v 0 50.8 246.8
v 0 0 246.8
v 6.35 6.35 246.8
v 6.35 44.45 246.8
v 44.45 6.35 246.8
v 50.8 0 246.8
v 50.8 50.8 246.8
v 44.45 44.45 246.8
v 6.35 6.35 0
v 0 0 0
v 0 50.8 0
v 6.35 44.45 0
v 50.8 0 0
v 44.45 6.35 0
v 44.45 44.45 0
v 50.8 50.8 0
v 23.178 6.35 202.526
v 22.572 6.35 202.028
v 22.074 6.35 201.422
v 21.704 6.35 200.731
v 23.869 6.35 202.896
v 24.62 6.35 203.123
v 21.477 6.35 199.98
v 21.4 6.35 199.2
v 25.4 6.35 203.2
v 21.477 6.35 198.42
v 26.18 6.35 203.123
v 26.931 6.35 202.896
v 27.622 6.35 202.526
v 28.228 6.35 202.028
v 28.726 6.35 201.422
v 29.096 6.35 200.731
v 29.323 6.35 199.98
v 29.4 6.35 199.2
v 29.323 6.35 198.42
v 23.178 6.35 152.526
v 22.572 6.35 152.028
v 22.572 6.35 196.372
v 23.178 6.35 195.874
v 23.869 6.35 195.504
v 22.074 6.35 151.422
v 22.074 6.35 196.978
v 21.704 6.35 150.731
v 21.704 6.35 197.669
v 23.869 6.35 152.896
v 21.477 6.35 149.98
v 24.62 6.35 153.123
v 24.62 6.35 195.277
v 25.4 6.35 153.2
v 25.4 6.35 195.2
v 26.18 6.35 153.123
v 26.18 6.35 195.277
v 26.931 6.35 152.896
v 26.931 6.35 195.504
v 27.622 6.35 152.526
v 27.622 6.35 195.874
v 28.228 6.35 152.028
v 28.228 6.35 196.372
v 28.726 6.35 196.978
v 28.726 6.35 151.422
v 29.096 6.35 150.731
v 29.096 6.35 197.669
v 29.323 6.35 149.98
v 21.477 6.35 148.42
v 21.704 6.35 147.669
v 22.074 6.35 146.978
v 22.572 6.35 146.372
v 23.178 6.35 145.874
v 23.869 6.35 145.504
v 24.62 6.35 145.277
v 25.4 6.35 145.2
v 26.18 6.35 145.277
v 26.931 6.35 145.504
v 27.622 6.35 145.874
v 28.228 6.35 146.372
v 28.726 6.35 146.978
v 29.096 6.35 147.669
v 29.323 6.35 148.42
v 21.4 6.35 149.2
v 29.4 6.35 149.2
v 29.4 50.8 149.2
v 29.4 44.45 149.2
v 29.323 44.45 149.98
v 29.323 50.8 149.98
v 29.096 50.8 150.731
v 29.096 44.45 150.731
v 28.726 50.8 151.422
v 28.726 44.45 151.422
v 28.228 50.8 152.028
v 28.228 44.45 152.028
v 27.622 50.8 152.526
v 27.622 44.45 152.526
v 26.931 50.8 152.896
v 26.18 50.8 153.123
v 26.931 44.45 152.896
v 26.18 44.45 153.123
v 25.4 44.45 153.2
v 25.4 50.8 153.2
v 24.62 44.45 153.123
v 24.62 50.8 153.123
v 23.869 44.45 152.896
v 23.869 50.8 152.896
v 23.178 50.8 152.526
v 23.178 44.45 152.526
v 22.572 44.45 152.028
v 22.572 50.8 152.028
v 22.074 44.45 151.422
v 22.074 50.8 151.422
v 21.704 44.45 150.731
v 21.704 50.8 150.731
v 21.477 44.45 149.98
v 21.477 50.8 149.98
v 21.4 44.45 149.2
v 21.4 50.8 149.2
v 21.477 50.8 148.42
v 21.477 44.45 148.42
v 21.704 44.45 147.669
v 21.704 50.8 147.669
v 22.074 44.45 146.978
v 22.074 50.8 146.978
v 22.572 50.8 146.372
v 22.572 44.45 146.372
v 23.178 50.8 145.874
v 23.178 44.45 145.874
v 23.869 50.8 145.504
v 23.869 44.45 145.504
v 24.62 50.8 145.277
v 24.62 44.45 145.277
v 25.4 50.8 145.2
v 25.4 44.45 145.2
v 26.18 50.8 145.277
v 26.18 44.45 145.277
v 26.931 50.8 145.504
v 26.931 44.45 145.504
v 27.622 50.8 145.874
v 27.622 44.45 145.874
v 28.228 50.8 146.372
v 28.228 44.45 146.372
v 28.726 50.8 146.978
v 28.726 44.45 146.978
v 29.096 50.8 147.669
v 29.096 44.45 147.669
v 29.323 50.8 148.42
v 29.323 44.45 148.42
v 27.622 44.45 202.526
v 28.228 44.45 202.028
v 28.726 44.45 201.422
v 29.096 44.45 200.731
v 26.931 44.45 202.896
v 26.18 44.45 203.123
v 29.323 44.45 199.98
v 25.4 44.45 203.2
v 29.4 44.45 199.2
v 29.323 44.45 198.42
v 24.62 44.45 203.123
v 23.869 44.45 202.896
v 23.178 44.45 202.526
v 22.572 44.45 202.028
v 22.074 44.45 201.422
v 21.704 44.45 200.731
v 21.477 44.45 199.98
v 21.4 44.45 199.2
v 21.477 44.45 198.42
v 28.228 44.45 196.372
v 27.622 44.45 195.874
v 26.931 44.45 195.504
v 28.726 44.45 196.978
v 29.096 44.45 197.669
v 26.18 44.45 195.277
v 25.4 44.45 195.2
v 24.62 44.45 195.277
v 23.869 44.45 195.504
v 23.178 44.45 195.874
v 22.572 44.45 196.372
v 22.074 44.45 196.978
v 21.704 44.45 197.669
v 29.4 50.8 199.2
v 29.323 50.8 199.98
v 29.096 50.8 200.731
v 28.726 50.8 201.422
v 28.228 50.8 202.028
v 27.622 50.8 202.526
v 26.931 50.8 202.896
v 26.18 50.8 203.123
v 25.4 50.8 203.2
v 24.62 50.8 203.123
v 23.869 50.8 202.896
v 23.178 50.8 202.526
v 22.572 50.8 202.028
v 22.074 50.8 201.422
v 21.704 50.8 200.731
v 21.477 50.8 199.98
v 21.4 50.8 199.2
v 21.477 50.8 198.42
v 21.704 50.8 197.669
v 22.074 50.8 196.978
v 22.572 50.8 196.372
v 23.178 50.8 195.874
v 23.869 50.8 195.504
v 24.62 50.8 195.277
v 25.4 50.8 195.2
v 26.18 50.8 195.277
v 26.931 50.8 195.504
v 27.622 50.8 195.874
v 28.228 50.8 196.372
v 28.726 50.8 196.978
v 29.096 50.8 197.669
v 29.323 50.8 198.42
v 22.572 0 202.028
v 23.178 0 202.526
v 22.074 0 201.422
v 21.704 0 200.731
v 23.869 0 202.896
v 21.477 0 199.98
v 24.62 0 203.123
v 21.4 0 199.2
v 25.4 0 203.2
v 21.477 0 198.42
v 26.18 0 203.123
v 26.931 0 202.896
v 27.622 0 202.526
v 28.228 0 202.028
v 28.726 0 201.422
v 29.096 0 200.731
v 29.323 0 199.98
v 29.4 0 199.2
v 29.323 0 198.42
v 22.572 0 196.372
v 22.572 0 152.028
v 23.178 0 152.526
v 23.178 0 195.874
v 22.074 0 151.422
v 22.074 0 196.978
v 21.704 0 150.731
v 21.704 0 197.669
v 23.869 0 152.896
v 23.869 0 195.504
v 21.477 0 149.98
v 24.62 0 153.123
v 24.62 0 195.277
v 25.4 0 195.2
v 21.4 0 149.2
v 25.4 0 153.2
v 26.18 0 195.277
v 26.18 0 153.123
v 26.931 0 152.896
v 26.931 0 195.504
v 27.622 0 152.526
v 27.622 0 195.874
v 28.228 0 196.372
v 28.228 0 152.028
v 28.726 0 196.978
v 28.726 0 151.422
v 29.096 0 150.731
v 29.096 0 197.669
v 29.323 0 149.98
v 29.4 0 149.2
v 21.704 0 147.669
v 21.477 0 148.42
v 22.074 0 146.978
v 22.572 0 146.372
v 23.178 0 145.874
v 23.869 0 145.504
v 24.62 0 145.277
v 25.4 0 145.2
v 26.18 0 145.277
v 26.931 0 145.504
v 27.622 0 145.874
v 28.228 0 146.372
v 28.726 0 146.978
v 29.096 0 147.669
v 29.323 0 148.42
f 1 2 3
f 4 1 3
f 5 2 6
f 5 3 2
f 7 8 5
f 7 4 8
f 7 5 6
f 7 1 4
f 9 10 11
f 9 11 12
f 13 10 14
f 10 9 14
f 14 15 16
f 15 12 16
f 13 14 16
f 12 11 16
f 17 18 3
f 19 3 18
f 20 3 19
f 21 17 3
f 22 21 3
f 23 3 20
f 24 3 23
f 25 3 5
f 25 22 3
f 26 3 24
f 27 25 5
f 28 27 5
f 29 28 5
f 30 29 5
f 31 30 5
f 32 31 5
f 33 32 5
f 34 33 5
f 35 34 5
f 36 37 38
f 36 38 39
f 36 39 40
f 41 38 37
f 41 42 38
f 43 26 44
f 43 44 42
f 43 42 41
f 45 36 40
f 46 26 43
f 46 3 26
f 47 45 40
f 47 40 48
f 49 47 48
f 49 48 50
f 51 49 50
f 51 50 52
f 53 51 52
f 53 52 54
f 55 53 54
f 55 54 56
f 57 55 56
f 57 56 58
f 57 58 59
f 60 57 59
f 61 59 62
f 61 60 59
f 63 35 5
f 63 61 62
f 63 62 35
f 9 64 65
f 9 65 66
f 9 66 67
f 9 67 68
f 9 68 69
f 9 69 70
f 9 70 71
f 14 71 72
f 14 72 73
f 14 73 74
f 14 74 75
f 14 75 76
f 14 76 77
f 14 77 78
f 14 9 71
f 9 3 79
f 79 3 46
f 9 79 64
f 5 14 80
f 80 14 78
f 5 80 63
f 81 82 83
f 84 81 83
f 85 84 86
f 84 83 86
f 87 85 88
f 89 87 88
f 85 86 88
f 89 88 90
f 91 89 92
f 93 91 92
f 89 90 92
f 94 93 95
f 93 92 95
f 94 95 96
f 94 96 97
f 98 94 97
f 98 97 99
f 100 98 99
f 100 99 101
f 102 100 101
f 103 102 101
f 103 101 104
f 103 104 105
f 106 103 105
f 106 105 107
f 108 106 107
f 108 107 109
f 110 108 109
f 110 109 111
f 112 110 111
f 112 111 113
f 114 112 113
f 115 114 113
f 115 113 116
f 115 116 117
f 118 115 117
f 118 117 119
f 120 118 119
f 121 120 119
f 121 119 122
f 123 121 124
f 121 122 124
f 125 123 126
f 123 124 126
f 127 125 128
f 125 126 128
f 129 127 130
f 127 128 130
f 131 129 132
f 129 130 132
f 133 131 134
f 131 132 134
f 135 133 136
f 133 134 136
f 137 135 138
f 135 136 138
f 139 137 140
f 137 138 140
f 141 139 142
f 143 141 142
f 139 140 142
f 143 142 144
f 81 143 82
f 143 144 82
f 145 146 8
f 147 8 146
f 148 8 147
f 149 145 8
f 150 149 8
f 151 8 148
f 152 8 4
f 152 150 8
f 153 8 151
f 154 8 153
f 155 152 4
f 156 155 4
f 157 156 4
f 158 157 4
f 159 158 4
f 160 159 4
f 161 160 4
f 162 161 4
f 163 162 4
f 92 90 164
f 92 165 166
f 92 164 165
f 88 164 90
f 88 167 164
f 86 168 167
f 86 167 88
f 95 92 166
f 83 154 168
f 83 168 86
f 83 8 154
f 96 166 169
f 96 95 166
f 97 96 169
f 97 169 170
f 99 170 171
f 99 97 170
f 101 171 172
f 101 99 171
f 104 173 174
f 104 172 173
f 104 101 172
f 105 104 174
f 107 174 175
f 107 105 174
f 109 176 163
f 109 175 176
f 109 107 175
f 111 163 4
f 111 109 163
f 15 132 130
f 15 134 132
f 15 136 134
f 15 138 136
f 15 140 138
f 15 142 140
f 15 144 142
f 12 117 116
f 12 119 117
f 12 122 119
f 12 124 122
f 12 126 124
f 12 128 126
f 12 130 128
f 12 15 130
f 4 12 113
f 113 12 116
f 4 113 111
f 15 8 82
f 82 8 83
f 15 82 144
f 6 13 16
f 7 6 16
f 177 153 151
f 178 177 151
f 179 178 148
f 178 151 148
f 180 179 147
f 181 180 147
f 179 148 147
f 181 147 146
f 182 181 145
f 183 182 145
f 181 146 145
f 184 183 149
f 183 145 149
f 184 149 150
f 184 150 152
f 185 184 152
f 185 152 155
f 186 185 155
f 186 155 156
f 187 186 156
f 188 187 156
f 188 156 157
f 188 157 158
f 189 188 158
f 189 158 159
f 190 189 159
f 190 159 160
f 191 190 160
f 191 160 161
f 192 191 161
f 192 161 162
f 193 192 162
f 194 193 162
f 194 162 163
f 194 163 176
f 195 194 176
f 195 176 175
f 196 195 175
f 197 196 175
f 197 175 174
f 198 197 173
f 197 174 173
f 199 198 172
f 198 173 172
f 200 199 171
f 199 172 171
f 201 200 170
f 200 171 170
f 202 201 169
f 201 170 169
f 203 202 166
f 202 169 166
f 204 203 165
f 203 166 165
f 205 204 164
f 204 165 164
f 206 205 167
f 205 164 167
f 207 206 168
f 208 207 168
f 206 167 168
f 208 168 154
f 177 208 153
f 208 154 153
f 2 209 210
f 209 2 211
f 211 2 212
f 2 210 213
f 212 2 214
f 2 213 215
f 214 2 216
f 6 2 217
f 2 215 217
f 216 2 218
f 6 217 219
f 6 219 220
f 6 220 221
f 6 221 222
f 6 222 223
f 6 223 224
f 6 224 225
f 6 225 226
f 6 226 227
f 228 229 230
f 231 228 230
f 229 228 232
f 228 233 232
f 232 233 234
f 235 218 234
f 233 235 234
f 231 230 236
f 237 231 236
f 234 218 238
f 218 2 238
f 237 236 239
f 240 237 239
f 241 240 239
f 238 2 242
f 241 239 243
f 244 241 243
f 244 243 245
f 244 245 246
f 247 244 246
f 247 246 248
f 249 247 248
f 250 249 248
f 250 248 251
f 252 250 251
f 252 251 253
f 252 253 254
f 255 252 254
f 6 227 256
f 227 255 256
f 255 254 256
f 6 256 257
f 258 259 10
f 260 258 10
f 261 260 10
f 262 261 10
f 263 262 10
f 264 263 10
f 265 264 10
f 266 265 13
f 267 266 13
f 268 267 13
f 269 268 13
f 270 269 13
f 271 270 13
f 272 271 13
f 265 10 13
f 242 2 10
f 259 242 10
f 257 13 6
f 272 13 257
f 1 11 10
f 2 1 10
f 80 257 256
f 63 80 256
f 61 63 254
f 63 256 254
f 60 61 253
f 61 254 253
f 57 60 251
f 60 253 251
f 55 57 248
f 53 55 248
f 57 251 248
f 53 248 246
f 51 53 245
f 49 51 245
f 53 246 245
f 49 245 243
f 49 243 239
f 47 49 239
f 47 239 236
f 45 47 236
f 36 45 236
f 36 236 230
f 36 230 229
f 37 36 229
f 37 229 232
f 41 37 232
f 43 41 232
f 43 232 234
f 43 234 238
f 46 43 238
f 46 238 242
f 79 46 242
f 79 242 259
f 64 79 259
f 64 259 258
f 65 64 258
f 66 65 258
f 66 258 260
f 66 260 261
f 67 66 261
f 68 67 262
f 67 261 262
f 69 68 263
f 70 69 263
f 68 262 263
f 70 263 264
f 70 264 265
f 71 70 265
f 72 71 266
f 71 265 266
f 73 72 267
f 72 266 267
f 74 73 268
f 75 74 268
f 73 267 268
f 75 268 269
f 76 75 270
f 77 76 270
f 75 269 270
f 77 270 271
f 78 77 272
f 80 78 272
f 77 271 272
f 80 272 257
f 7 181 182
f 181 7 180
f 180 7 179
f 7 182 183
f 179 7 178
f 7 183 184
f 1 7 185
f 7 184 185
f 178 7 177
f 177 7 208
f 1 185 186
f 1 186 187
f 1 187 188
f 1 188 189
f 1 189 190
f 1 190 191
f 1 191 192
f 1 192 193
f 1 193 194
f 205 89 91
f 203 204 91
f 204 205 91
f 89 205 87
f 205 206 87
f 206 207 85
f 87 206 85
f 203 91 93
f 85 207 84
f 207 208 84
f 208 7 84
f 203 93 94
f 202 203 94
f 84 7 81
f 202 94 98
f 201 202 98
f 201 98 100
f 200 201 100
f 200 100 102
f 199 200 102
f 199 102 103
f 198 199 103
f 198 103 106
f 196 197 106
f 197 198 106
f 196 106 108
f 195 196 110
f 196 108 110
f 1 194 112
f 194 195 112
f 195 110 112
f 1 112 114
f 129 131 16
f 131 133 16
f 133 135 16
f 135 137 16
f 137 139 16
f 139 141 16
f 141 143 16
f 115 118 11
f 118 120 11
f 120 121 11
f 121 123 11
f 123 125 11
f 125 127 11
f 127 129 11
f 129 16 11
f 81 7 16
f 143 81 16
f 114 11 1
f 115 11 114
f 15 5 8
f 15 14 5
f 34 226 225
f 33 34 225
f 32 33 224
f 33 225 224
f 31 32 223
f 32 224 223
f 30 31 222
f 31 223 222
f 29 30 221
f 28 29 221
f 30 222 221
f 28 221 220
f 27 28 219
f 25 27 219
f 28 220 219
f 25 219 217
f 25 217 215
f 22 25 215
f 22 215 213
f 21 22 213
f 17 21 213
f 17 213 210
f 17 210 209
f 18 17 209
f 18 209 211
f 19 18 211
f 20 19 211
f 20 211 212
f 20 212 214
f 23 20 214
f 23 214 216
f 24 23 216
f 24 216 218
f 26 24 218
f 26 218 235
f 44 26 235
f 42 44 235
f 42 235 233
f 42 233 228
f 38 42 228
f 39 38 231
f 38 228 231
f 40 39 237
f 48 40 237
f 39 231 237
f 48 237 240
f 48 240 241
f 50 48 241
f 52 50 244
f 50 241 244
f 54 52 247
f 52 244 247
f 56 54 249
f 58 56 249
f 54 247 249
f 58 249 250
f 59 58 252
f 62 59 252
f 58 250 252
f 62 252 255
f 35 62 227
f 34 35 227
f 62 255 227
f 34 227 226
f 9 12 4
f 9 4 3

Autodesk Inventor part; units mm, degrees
ref_plane "YZ Plane" through (0, 0, 0) normal (1, 0, 0) x (0, 1, 0)
ref_plane "XZ Plane" through (0, 0, 0) normal (0, 1, 0) x (-1, 0, 0)
ref_plane "XY Plane" through (0, 0, 0) normal (0, 0, 1) x (1, 0, 0)
sketch "Sketch1" plane through (0, 0, 0) normal (0, 0, 1) x (1, 0, 0)
  line L0 (0, 0) -> (50.8, 0)
  line L1 (50.8, 0) -> (50.8, 50.8)
  line L2 (50.8, 50.8) -> (0, 50.8)
  line L3 (0, 50.8) -> (0, 0)
  line L4 (6.35, 6.35) -> (44.45, 6.35)
  line L5 (44.45, 6.35) -> (44.45, 44.45)
  line L6 (44.45, 44.45) -> (6.35, 44.45)
  line L7 (6.35, 44.45) -> (6.35, 6.35)
  dimension "d0" = 50.8
  dimension "d1" = 50.8
  dimension "d2" = 6.35
extrude "Extrusion1" add sketch "Sketch1" along normal blind 246.8
sketch "Sketch2" plane through (0, 0, 0) normal (0, -1, 0) x (1, 0, 0)
  circle A0 centre (25.4, 149.2) radius 4
  circle A1 centre (25.4, 199.2) radius 4
  line L0 (0, 246.8) -> (50.8, 246.8) projected
  line L1 (0, 0) -> (50.8, 0) projected
  point P0 (25.4, 246.8)
  dimension "d5" = 8
  dimension "d6" = 8
  dimension "d7" = 50
  dimension "d8" = 149.2
extrude "Extrusion2" cut sketch "Sketch2" against normal through all
properties part number "ST22" material "Aluminum 6061"
